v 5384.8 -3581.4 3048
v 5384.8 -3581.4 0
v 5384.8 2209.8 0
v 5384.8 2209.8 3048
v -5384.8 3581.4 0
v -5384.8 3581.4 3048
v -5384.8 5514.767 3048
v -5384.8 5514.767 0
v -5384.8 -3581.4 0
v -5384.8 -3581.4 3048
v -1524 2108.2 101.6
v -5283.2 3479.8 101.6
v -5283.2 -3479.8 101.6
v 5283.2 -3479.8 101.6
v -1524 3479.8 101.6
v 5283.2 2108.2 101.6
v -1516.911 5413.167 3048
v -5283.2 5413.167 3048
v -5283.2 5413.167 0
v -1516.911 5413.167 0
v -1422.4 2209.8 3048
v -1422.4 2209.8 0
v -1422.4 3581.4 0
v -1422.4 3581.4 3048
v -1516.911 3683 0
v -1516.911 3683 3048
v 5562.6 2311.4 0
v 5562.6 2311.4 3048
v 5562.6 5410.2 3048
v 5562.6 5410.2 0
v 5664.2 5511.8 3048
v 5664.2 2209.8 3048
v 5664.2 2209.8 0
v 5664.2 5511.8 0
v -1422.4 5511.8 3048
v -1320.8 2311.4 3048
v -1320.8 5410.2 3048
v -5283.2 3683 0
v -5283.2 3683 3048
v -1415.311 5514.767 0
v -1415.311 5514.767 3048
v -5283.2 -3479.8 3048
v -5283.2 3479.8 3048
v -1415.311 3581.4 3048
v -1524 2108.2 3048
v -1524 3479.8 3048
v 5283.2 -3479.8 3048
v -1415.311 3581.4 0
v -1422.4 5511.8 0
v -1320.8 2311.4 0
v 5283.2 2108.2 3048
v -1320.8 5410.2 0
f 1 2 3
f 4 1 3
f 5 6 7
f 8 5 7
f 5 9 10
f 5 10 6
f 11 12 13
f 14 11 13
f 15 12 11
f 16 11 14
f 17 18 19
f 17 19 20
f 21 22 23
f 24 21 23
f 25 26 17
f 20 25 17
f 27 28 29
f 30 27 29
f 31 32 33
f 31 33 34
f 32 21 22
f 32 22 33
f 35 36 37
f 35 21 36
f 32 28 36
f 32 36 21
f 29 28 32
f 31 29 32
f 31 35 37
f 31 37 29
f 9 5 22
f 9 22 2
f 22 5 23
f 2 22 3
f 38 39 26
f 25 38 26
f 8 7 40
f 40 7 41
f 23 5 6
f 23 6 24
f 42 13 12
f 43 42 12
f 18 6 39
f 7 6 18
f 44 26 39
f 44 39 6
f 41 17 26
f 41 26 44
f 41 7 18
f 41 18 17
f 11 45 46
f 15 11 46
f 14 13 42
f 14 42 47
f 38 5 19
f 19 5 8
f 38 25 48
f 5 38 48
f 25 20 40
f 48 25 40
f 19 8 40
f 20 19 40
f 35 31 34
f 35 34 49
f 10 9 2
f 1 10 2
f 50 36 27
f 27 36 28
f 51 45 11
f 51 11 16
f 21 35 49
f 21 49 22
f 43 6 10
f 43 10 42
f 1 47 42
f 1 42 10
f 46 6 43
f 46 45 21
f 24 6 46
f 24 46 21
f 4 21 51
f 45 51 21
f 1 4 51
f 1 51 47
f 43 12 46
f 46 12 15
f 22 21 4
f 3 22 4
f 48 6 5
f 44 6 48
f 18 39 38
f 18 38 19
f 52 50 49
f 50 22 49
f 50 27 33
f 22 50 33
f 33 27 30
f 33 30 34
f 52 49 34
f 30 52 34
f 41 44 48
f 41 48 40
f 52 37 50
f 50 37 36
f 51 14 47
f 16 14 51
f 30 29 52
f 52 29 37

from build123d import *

# Parameters (mm, degrees)
F0_W     = 10769.6
F0_H     = 7162.8
F1_DEPTH = 3048
F2_W     = 6807.2
F2_H     = 1371.6
F3_DEPTH = 3048.001
F4_T     = -101.6
F6_DEPTH = 3048
F7_T     = -101.6
F8_W     = 3969.4886634827
F8_H     = 1933.3666931152
F9_DEPTH = 3048
F10_T    = -101.6


with BuildPart() as f1:
    # F0 (on Top) → F1 (new body)
    with BuildSketch(Plane.XY):
        Rectangle(F0_W, F0_H)
    extrude(amount=F1_DEPTH)

    # F2 (on face) → F3 (cut, through all)
    with BuildSketch(Plane.XY.offset(3048)):
        with Locations((1981.2, 2895.6)):
            Rectangle(F2_W, F2_H)
    extrude(amount=-F3_DEPTH, mode=Mode.SUBTRACT)

    # F4
    f4_openings = [f1.faces().sort_by_distance(p)[0] for p in [
        (-272.816533, -398.731857, 3048),
    ]]
    offset(amount=F4_T, openings=f4_openings, kind=Kind.INTERSECTION)


with BuildPart() as f6:
    # F5 (on face) → F6 (new body)
    with BuildSketch(Plane.XY.offset(3048)):
        Polygon((-1422.4, 3581.4), (-1422.4, 2209.8), (5384.8, 2209.8), (5664.2, 2209.8), (5664.2, 5511.8), (-1422.4, 5511.8), align=None)
    extrude(amount=-F6_DEPTH)

    # F7
    f7_openings = [f6.faces().sort_by_distance(p)[0] for p in [
        (2120.9, 3860.8, 3048),
        (2120.9, 3860.8, 0),
    ]]
    offset(amount=F7_T, openings=f7_openings)


with BuildPart() as f9:
    # F8 (on face) → F9 (new body)
    with BuildSketch(Plane.XY.offset(3048)):
        with Locations((-3400.0556682587, 4548.0833465576)):
            Rectangle(F8_W, F8_H)
    extrude(amount=-F9_DEPTH)

    # F10
    f10_openings = [f9.faces().sort_by_distance(p)[0] for p in [
        (-3400.055668, 4548.083347, 0),
        (-3400.055668, 4548.083347, 3048),
    ]]
    offset(amount=F10_T, openings=f10_openings)


solid = Compound([f1.part, f6.part, f9.part])
